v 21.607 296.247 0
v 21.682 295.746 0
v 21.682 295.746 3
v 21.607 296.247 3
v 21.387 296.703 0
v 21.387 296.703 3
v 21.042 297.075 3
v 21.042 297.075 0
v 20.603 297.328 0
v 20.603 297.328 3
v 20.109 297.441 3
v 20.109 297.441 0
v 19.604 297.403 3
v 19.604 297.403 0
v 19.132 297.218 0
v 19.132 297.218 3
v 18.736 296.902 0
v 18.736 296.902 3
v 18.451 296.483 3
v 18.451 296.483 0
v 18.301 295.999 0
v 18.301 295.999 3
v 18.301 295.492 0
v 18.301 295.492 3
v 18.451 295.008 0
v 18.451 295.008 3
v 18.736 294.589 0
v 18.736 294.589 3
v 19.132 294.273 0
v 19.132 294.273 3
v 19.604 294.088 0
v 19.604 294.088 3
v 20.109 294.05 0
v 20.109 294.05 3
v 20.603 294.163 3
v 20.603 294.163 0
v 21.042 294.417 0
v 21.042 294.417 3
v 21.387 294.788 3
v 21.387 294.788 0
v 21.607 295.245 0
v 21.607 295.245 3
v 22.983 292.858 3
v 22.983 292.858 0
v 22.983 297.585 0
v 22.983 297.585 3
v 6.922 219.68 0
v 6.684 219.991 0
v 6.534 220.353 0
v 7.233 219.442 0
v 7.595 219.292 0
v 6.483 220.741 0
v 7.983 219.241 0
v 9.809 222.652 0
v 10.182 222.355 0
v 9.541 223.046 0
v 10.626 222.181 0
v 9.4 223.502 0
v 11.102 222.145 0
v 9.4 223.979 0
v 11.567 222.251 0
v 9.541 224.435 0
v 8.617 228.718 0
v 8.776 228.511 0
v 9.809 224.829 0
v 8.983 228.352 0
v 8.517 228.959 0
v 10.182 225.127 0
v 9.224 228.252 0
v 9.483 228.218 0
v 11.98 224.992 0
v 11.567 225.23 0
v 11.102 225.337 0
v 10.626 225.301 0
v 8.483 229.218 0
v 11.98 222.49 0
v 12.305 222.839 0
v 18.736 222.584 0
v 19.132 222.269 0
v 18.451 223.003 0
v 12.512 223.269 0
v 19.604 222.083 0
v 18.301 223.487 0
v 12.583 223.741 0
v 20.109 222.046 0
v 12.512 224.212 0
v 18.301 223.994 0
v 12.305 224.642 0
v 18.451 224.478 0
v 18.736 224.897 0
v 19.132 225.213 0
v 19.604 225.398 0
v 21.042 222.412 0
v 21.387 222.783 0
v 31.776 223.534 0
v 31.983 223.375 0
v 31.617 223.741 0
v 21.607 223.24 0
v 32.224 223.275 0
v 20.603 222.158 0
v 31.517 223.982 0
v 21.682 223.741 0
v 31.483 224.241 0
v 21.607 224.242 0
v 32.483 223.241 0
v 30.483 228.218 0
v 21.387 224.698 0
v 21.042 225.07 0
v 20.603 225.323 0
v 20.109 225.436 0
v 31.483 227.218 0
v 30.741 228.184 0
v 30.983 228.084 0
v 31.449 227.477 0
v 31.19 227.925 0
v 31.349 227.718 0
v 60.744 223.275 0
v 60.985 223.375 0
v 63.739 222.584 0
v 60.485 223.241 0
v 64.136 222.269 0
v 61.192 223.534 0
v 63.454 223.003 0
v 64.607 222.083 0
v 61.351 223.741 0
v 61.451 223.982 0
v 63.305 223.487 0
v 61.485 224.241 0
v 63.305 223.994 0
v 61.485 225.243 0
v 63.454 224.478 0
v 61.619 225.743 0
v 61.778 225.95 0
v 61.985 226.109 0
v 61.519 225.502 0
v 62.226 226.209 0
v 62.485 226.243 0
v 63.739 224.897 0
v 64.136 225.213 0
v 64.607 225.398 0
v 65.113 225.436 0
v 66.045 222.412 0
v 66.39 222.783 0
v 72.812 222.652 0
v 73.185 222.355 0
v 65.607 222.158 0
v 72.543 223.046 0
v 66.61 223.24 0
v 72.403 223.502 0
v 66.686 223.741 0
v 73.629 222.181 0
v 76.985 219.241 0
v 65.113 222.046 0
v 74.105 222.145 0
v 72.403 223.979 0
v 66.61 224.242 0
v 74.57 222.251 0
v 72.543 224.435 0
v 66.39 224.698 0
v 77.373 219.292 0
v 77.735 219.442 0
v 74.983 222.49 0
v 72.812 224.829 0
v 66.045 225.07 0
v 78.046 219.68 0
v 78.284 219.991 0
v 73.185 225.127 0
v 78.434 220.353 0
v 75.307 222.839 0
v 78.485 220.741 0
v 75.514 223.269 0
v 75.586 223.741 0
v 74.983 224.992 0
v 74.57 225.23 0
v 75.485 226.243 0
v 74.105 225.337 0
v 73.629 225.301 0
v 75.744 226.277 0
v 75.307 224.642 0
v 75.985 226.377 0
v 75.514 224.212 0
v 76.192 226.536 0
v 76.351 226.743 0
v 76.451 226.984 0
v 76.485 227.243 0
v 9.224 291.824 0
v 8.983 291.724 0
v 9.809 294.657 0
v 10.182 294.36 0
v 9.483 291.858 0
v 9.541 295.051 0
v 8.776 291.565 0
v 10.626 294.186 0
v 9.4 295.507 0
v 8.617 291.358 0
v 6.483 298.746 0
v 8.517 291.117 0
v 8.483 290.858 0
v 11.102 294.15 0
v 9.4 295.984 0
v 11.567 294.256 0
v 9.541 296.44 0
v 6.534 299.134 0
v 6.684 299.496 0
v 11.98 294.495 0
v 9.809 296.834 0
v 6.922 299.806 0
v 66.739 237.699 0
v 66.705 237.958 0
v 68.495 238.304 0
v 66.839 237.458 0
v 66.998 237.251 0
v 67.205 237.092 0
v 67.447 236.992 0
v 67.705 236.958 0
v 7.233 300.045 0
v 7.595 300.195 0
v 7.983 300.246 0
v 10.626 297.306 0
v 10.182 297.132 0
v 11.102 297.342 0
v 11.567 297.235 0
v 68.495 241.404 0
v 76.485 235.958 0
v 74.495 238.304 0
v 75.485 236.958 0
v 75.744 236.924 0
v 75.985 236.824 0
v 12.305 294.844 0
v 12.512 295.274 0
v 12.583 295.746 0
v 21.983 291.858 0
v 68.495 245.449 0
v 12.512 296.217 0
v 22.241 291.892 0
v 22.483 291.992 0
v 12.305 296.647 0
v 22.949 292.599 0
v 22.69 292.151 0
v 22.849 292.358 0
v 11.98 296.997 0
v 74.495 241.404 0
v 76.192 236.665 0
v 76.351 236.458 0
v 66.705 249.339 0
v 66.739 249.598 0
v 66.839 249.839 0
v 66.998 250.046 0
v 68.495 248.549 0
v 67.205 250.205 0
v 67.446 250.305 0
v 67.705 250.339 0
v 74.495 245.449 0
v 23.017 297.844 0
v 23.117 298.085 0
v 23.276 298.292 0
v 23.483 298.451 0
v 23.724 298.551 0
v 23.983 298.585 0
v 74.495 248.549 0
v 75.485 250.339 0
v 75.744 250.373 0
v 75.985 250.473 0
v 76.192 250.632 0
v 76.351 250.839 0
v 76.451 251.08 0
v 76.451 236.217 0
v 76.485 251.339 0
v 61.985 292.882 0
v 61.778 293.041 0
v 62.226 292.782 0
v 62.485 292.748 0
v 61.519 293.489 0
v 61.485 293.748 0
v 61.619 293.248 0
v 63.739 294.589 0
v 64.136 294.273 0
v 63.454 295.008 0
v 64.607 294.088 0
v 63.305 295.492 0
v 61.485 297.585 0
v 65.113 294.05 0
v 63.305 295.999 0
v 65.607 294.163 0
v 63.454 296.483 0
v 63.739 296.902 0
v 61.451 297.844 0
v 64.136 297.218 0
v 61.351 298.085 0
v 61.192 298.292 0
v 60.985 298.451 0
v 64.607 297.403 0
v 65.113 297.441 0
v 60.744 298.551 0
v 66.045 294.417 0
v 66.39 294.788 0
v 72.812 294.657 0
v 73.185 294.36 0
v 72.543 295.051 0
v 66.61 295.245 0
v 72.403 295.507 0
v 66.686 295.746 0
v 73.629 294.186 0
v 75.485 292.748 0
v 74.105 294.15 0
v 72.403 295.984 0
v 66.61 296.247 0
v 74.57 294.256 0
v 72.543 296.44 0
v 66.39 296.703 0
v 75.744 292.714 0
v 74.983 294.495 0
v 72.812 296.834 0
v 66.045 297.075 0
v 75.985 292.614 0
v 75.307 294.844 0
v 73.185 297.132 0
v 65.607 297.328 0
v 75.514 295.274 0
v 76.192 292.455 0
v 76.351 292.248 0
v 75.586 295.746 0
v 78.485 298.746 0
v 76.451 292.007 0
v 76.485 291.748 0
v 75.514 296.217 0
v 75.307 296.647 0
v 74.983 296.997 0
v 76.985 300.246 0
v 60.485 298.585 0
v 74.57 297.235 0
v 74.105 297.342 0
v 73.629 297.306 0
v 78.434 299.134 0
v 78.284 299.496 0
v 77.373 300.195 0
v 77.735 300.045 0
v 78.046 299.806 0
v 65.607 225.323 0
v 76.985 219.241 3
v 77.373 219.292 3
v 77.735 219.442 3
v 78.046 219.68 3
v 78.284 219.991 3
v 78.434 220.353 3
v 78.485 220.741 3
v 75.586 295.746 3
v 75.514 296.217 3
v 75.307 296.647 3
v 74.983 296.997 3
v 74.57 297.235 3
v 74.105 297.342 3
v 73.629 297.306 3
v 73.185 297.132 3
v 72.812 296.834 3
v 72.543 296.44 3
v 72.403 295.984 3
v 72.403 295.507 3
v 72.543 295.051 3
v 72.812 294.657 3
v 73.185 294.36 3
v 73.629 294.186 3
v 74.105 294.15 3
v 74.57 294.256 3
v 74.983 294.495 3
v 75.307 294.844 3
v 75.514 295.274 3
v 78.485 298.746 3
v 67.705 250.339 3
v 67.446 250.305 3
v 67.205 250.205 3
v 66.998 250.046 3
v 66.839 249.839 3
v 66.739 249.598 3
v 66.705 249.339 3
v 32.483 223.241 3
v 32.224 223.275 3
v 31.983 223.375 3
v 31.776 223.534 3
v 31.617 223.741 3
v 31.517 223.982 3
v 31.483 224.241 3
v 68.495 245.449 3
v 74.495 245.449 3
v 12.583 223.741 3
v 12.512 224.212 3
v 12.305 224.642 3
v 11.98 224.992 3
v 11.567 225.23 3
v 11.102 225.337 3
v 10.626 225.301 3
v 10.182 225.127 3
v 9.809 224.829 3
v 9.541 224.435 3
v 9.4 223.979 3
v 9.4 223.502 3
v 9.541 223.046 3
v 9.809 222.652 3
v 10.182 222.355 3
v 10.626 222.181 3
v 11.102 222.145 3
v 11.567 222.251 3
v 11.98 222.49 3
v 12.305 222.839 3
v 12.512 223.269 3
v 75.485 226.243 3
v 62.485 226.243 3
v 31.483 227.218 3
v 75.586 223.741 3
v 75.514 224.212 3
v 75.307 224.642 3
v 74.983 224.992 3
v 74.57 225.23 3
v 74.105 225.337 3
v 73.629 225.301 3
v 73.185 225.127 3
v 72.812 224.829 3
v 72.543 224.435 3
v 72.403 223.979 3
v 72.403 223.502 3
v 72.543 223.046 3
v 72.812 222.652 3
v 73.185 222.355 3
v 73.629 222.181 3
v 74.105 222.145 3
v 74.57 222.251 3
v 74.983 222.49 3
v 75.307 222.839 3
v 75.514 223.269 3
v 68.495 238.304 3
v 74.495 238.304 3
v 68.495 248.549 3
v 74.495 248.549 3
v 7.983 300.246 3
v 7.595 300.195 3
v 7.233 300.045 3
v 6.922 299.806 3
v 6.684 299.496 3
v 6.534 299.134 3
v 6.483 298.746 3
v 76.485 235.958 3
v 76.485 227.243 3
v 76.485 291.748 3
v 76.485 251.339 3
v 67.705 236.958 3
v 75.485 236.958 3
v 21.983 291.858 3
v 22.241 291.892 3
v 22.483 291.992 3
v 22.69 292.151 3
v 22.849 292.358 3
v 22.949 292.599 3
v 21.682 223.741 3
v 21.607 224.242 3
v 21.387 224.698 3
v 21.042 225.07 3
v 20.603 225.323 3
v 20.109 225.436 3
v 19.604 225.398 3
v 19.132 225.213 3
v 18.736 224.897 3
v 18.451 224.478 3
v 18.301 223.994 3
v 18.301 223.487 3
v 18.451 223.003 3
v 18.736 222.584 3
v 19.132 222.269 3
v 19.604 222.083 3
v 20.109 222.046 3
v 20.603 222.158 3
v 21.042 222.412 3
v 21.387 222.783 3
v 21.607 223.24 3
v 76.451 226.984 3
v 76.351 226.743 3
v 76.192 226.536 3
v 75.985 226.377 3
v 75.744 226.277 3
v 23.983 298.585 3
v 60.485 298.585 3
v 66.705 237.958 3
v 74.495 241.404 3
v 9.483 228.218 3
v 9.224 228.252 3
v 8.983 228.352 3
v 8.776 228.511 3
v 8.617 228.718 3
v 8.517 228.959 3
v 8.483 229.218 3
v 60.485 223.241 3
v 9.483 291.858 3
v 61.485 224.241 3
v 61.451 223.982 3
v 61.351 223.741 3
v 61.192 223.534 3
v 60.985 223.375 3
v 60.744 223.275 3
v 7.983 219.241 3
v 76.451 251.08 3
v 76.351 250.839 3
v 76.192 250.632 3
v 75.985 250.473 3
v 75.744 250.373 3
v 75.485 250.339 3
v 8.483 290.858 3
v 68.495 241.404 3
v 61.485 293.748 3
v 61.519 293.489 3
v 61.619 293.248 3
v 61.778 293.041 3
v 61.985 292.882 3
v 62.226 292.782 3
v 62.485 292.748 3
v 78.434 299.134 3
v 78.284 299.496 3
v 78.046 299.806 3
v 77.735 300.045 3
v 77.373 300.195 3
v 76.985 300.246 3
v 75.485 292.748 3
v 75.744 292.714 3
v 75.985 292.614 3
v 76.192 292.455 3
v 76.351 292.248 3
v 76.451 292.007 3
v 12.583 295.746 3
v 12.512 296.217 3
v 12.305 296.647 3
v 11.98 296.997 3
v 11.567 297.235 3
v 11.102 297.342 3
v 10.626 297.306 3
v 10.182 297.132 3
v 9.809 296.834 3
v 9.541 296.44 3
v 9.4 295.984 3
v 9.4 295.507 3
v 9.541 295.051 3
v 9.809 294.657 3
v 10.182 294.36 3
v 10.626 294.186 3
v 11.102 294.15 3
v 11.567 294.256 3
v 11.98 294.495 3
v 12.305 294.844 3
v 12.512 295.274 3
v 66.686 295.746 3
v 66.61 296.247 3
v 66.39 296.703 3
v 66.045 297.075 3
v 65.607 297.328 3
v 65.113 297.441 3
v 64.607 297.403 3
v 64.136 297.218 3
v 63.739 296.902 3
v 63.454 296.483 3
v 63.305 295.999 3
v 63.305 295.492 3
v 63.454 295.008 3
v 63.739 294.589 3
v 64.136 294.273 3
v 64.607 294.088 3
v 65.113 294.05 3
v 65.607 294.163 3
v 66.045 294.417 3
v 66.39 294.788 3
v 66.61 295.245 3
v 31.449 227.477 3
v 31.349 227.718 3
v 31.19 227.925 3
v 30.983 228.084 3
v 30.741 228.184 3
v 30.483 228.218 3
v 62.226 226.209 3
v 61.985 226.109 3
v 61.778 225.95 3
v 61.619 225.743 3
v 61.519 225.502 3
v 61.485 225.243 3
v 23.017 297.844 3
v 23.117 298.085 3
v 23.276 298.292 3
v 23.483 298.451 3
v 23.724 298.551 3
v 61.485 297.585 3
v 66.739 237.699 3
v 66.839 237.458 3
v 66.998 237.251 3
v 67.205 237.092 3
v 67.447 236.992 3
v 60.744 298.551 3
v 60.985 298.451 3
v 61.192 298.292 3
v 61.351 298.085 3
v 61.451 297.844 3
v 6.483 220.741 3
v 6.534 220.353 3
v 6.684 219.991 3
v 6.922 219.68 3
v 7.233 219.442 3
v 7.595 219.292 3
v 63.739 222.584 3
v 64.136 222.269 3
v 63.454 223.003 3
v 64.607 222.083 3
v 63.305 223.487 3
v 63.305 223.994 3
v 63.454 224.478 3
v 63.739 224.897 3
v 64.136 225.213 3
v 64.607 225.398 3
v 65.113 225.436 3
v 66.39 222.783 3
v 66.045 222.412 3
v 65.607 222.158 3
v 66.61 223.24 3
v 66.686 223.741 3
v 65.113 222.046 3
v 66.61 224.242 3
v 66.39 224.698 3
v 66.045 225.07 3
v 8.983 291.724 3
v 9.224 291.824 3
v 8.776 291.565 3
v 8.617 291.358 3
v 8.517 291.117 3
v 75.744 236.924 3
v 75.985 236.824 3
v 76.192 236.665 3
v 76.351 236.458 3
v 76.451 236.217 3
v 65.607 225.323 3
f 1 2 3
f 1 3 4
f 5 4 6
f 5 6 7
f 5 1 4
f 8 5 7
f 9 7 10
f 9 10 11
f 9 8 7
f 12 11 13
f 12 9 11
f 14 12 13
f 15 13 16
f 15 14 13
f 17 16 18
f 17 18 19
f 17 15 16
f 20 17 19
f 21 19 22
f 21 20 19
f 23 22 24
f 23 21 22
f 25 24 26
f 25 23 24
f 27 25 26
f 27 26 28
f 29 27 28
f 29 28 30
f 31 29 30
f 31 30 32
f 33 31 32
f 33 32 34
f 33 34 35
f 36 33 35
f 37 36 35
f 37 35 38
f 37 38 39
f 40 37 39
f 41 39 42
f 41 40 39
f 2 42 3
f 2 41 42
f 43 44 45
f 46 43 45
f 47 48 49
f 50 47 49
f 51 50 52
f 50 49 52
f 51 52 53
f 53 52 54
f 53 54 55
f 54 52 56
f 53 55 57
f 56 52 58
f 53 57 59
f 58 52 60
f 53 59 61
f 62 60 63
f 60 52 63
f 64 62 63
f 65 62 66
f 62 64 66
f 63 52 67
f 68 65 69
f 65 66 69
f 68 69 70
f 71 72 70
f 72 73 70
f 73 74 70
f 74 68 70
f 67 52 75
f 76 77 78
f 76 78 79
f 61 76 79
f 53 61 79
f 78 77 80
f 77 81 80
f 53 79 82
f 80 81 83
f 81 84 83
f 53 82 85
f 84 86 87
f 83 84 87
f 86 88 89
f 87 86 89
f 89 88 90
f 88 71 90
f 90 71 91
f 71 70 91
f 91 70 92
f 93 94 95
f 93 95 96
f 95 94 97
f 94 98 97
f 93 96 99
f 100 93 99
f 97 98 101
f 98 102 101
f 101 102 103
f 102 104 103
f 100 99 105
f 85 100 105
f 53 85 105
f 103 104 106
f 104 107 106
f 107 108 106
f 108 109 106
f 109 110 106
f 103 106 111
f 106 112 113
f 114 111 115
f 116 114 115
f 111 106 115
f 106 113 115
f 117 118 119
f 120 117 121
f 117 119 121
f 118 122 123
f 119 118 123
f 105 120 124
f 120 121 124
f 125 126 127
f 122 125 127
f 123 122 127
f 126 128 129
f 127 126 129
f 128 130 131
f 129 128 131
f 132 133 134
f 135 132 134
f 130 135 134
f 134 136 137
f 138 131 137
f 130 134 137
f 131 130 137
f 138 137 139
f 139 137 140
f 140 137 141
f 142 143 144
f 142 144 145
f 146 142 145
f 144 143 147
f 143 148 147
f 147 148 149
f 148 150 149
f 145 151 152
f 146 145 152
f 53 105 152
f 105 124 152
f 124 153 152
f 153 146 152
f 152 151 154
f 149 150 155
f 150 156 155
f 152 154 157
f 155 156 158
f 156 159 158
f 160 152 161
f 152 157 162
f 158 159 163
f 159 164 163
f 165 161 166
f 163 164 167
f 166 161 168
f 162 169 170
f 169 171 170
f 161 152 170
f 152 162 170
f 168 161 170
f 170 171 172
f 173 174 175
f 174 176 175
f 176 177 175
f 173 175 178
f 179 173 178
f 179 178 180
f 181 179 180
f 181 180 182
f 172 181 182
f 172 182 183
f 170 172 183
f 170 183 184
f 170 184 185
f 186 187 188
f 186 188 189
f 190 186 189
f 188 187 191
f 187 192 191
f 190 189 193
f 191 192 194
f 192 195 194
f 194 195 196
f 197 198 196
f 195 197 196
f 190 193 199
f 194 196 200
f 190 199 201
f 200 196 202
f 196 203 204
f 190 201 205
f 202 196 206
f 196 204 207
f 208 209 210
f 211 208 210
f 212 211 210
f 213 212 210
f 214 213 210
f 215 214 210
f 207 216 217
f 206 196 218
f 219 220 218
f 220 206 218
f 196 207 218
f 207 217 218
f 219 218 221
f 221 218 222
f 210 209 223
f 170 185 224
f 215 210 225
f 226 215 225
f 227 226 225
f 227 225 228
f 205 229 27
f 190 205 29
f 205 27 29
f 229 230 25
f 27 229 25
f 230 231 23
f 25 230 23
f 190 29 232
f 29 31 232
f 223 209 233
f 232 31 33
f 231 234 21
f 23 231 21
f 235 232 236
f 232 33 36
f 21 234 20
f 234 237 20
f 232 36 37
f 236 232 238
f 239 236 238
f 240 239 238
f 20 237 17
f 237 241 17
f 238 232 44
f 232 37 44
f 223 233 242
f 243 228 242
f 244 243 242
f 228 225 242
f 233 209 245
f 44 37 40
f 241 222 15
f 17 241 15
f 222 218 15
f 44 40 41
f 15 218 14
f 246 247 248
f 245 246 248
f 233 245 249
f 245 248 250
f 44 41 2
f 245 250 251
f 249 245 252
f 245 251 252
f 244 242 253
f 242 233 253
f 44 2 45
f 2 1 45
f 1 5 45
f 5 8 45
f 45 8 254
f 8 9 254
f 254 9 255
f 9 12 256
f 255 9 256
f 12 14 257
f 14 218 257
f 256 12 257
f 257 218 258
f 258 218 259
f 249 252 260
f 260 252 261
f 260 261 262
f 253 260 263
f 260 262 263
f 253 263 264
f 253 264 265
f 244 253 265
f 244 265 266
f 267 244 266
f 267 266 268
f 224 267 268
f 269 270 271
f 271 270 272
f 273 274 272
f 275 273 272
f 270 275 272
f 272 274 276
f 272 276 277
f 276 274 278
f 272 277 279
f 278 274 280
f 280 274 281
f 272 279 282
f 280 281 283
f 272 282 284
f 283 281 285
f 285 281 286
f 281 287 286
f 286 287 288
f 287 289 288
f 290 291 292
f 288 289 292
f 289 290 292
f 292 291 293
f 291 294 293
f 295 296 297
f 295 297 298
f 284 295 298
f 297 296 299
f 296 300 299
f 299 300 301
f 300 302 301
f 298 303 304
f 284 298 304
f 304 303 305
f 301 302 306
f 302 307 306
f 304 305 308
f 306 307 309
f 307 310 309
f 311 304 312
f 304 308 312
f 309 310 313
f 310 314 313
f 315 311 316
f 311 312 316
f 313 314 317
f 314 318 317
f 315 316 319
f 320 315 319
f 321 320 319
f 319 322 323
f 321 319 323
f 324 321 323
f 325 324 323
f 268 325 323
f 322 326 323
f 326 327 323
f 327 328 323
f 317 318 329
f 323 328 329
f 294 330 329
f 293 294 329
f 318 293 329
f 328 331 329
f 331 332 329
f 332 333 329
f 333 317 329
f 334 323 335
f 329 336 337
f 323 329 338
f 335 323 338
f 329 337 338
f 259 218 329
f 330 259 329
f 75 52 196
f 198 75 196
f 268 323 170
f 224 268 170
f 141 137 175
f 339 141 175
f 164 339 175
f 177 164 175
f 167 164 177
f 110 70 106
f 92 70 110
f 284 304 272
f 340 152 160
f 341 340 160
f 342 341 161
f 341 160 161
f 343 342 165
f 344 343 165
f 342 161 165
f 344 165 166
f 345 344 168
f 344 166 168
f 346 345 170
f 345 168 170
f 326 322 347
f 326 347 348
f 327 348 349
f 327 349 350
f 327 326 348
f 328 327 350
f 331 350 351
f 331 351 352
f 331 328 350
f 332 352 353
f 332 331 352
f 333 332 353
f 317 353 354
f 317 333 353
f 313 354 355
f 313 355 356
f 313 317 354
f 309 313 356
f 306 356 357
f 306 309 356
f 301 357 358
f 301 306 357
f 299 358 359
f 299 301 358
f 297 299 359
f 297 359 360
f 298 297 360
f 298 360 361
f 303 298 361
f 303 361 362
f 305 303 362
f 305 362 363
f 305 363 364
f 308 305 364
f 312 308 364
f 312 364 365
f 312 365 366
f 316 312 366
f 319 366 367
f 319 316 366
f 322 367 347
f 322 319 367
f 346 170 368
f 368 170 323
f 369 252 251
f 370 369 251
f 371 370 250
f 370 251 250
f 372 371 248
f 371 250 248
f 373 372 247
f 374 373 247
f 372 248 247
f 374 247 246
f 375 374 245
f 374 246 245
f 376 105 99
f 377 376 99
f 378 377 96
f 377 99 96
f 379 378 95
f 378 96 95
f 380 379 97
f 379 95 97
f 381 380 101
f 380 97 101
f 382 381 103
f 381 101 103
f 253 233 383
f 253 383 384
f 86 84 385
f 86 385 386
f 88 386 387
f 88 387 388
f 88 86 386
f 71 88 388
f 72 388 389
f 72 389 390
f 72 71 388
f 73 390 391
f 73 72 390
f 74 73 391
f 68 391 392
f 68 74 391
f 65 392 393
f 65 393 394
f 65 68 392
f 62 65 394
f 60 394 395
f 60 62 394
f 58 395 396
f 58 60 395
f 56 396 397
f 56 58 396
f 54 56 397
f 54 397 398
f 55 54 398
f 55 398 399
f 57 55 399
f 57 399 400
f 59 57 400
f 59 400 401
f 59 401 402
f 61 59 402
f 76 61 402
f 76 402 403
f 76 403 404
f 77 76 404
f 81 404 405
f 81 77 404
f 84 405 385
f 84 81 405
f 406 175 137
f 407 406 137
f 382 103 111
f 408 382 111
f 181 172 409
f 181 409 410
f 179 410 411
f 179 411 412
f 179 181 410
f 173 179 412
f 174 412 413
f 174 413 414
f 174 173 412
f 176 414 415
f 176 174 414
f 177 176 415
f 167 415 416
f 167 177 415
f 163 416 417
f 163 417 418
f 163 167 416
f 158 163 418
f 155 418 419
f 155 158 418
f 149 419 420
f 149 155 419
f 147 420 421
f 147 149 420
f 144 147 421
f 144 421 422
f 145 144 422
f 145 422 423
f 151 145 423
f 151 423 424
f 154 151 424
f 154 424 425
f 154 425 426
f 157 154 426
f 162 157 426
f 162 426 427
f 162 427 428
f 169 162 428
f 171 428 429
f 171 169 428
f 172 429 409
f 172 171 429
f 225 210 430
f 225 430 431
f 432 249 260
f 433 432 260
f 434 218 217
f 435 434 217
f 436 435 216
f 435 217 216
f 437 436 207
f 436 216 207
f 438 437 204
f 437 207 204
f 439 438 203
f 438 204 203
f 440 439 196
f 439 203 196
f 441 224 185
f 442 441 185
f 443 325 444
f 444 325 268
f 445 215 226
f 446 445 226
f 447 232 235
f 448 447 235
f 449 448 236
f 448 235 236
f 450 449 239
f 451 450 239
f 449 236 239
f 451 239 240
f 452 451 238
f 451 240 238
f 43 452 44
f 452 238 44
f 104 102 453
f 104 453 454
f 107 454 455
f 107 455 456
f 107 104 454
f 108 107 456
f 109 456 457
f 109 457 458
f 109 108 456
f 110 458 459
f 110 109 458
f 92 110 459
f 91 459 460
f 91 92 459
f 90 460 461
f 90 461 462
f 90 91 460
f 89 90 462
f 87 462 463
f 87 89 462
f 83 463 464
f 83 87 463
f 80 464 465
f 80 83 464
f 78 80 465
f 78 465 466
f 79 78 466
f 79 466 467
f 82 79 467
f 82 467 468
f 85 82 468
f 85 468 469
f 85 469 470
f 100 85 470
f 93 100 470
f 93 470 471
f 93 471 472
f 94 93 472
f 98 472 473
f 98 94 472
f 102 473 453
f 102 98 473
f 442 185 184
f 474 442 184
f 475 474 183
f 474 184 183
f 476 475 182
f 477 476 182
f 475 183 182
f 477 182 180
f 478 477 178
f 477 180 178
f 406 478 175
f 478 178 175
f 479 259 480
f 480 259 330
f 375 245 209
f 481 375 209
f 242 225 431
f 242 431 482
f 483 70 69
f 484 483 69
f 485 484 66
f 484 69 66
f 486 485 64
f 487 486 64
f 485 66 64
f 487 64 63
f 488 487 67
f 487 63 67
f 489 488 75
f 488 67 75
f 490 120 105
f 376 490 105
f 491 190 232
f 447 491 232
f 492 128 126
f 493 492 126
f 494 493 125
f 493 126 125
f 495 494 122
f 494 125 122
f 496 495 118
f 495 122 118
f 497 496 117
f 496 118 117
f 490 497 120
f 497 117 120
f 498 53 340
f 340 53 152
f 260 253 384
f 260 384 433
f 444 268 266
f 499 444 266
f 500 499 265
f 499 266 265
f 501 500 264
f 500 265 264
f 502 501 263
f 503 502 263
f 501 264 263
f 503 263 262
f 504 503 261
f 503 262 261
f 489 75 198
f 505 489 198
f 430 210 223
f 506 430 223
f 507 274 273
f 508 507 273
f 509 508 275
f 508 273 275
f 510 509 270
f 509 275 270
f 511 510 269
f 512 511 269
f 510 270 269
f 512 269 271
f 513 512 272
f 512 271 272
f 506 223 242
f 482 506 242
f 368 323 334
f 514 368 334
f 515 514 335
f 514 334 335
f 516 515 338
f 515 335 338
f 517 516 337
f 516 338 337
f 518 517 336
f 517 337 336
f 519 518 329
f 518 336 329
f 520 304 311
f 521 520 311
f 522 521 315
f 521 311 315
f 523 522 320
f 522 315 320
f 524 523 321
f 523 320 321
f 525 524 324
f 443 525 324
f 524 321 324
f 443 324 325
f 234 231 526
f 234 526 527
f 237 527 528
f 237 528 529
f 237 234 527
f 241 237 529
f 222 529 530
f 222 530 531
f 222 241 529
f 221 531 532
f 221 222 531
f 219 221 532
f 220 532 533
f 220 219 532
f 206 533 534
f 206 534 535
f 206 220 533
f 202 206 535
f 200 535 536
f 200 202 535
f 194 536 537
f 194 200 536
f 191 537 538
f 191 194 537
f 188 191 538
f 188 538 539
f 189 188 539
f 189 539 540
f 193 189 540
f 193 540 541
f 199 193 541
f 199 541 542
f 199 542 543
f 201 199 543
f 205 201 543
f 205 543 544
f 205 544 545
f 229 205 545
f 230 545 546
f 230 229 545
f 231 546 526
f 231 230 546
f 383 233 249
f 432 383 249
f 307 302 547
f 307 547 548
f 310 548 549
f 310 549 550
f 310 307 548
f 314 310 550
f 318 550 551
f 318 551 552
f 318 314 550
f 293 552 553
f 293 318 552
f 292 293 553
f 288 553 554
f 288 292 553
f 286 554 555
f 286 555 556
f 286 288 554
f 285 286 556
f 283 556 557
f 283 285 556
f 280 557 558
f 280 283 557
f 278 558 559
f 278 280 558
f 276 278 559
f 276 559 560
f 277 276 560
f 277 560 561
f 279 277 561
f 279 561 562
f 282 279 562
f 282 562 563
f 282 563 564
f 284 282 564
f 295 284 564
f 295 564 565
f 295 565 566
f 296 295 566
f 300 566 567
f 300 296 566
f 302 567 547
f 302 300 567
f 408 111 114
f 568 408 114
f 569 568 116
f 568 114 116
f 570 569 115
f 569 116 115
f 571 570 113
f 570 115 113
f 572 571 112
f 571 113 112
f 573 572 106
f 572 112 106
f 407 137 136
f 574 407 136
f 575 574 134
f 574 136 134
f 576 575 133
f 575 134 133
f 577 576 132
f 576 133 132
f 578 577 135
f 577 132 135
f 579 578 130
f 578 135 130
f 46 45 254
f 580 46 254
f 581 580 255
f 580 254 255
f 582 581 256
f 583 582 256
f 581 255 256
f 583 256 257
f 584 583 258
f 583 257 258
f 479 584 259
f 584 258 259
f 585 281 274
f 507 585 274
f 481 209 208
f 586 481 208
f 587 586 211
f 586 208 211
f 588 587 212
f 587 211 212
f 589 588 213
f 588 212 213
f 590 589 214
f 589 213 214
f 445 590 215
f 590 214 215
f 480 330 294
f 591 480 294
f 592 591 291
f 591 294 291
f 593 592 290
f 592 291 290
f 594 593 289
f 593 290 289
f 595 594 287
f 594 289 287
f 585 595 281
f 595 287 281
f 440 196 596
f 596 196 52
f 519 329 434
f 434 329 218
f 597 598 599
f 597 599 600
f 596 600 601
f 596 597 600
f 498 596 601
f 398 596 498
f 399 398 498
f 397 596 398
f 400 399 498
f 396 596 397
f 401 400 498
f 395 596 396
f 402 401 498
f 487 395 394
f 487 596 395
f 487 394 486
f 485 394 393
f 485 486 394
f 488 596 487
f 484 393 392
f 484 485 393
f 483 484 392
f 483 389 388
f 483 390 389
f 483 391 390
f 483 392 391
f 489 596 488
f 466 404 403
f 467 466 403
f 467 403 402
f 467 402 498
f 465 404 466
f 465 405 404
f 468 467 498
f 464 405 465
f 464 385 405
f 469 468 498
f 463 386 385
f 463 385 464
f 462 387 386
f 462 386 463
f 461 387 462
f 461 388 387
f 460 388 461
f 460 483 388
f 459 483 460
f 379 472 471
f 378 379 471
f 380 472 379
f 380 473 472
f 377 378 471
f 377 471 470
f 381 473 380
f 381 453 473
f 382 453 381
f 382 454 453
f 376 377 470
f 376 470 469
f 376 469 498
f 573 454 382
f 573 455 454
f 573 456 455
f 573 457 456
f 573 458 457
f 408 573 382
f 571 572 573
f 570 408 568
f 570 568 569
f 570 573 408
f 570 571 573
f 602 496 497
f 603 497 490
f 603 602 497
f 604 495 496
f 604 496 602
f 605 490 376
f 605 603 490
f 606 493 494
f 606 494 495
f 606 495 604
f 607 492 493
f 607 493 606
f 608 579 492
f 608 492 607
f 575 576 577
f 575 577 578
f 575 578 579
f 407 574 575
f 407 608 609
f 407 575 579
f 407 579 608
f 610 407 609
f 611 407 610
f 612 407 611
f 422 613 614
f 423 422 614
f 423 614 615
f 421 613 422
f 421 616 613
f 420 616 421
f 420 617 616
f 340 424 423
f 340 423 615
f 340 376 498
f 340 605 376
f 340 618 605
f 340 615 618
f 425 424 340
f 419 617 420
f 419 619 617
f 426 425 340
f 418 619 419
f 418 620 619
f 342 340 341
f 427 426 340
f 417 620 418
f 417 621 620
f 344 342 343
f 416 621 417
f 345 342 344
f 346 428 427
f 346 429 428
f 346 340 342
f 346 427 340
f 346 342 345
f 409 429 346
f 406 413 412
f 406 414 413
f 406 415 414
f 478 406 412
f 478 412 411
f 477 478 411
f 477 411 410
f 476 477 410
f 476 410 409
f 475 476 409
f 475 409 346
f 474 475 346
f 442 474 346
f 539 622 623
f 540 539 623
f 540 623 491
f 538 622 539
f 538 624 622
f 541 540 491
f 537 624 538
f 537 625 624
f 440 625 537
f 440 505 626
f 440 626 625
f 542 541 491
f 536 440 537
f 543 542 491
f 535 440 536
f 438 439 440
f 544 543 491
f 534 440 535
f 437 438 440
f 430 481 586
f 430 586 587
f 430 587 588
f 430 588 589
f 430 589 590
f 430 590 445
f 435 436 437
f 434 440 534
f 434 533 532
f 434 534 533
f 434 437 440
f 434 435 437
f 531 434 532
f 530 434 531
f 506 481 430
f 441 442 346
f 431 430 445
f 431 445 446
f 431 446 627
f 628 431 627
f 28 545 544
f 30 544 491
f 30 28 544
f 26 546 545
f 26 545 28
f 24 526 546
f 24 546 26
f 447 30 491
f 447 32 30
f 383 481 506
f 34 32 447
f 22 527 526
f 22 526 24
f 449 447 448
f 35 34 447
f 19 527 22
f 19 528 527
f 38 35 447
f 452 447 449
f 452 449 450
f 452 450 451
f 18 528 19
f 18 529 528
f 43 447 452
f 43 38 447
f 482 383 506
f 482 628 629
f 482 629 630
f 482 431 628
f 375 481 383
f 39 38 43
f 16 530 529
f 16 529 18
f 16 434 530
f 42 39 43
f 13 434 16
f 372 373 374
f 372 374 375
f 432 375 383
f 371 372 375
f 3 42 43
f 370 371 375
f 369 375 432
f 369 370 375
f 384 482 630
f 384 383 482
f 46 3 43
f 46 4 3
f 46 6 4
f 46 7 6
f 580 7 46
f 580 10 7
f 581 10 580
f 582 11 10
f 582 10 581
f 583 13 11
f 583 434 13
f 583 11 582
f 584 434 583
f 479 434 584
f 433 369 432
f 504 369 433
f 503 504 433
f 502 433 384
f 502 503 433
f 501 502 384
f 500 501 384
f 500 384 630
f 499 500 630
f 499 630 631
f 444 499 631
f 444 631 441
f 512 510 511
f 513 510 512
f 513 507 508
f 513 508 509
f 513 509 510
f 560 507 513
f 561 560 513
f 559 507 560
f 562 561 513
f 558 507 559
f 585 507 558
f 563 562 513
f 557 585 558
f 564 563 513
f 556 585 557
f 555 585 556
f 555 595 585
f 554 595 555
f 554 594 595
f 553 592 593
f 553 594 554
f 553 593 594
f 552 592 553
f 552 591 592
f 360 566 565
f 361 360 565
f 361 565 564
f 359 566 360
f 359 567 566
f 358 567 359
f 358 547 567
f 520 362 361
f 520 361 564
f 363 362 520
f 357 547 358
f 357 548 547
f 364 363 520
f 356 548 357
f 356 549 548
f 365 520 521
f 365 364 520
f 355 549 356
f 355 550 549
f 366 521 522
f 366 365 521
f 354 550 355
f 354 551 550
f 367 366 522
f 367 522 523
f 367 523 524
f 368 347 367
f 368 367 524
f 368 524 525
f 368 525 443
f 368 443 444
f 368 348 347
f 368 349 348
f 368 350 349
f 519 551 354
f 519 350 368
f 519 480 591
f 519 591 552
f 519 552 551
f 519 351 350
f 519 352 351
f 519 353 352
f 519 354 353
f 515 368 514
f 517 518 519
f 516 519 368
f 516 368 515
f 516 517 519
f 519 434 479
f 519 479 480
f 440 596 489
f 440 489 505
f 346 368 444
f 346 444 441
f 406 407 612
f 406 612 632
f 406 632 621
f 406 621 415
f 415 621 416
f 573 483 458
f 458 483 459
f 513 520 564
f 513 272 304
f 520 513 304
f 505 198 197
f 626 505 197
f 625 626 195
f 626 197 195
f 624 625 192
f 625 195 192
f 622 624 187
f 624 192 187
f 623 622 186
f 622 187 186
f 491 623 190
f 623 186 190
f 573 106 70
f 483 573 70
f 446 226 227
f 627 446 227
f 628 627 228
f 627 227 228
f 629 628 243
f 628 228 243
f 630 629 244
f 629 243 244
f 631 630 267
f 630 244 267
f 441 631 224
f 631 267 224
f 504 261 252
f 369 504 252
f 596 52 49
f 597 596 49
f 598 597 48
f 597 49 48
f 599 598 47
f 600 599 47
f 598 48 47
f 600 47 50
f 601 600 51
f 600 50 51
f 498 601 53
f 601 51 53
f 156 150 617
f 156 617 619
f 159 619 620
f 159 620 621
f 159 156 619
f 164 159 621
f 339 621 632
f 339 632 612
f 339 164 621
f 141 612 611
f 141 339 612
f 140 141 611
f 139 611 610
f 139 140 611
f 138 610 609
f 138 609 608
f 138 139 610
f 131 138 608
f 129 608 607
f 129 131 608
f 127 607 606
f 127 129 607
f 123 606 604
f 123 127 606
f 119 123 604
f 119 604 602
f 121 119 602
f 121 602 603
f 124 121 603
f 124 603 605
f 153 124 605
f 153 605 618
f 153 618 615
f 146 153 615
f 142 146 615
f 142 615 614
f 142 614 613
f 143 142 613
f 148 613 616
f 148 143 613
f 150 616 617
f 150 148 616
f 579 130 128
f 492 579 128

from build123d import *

# Parameters (mm, degrees)
MODEL_R                 = 1.7
MODEL_R_2               = 1.600279216
MODEL_W                 = 6
MODEL_H                 = 3.1
SALIENTE_EXTRUIR1_DEPTH = 3


with BuildPart() as part:
    # Model → Saliente-Extruir1 (new body)
    with BuildSketch(Plane.XY):
        with BuildLine():
            Line((76.985222791, 300.245724916), (7.982818557, 300.245724916))
            ThreePointArc((7.982818557, 300.245724916), (6.922158385, 299.806385087), (6.482818557, 298.745724916))
            Line((6.482818557, 298.745724916), (6.482818557, 220.741115058))
            ThreePointArc((6.482818557, 220.741115058), (6.922158385, 219.680454886), (7.982818557, 219.241115058))
            Line((7.982818557, 219.241115058), (76.985222791, 219.241115058))
            ThreePointArc((76.985222791, 219.241115058), (78.045882963, 219.680454886), (78.485222791, 220.741115058))
            Line((78.485222791, 220.741115058), (78.485222791, 298.745724916))
            ThreePointArc((78.485222791, 298.745724916), (78.045882963, 299.806385087), (76.985222791, 300.245724916))
        make_face()
        with Locations((19.982149553, 223.740780556)):
            Circle(MODEL_R, mode=Mode.SUBTRACT)
        with Locations((64.985557294, 223.740780556)):
            Circle(MODEL_R, mode=Mode.SUBTRACT)
        with Locations((10.982484055, 223.740780556)):
            Circle(MODEL_R_2, mode=Mode.SUBTRACT)
        with Locations((73.985222791, 223.740780556)):
            Circle(MODEL_R_2, mode=Mode.SUBTRACT)
        with Locations((19.982149553, 295.745724916)):
            Circle(MODEL_R, mode=Mode.SUBTRACT)
        with Locations((64.985557294, 295.745724916)):
            Circle(MODEL_R, mode=Mode.SUBTRACT)
        with Locations((73.985222791, 295.745724916)):
            Circle(MODEL_R_2, mode=Mode.SUBTRACT)
        with Locations((10.982484055, 295.745724916)):
            Circle(MODEL_R_2, mode=Mode.SUBTRACT)
        with BuildLine():
            Line((76.48504158, 291.747923326), (76.48504158, 251.338841953))
            ThreePointArc((76.48504158, 251.338841953), (76.192148361, 250.631735172), (75.48504158, 250.338841953))
            Line((75.48504158, 250.338841953), (67.705071812, 250.338841953))
            ThreePointArc((67.705071812, 250.338841953), (66.997954371, 250.045938075), (66.705071812, 249.338811805))
            Line((66.705071812, 249.338811805), (66.705414934, 237.957679154))
            ThreePointArc((66.705414934, 237.957679154), (66.998318811, 237.250591862), (67.705414933, 236.957709302))
            Line((67.705414933, 236.957709302), (75.48504158, 236.957709302))
            ThreePointArc((75.48504158, 236.957709302), (76.192148361, 236.664816083), (76.48504158, 235.957709302))
            Line((76.48504158, 235.957709302), (76.48504158, 227.243313469))
            ThreePointArc((76.48504158, 227.243313469), (76.192148361, 226.536206687), (75.48504158, 226.243313469))
            Line((75.48504158, 226.243313469), (62.48504158, 226.243313469))
            ThreePointArc((62.48504158, 226.243313469), (61.777934798, 225.95042025), (61.48504158, 225.243313469))
            Line((61.48504158, 225.243313469), (61.48504158, 224.241115058))
            ThreePointArc((61.48504158, 224.241115058), (61.192148361, 223.534008277), (60.48504158, 223.241115058))
            Line((60.48504158, 223.241115058), (32.482637345, 223.241115058))
            ThreePointArc((32.482637345, 223.241115058), (31.775530564, 223.534008277), (31.482637345, 224.241115058))
            Line((31.482637345, 224.241115058), (31.482637345, 227.21772226))
            ThreePointArc((31.482637345, 227.21772226), (31.189744126, 227.924829041), (30.482637345, 228.21772226))
            Line((30.482637345, 228.21772226), (9.482637345, 228.21772226))
            ThreePointArc((9.482637345, 228.21772226), (8.775530564, 228.510615479), (8.482637345, 229.21772226))
            Line((8.482637345, 229.21772226), (8.482637345, 290.857923326))
            ThreePointArc((8.482637345, 290.857923326), (8.775530564, 291.565030108), (9.482637345, 291.857923326))
            Line((9.482637345, 291.857923326), (21.982637345, 291.857923326))
            ThreePointArc((21.982637345, 291.857923326), (22.689744126, 292.150816545), (22.982637345, 292.857923326))
            Line((22.982637345, 292.857923326), (22.982637345, 297.584751174))
            ThreePointArc((22.982637345, 297.584751174), (23.275530564, 298.291857955), (23.982637345, 298.584751174))
            Line((23.982637345, 298.584751174), (60.48504158, 298.584751174))
            ThreePointArc((60.48504158, 298.584751174), (61.192148361, 298.291857955), (61.48504158, 297.584751174))
            Line((61.48504158, 297.584751174), (61.48504158, 293.747923326))
            ThreePointArc((61.48504158, 293.747923326), (61.777934798, 293.040816545), (62.48504158, 292.747923326))
            Line((62.48504158, 292.747923326), (75.48504158, 292.747923326))
            ThreePointArc((75.48504158, 292.747923326), (76.192148361, 292.455030108), (76.48504158, 291.747923326))
        make_face(mode=Mode.SUBTRACT)
        with Locations((71.494936084, 246.999441896)):
            Rectangle(MODEL_W, MODEL_H, mode=Mode.SUBTRACT)
        with Locations((71.494936084, 239.854068189)):
            Rectangle(MODEL_W, MODEL_H, mode=Mode.SUBTRACT)
    extrude(amount=SALIENTE_EXTRUIR1_DEPTH)


solid = part.part
